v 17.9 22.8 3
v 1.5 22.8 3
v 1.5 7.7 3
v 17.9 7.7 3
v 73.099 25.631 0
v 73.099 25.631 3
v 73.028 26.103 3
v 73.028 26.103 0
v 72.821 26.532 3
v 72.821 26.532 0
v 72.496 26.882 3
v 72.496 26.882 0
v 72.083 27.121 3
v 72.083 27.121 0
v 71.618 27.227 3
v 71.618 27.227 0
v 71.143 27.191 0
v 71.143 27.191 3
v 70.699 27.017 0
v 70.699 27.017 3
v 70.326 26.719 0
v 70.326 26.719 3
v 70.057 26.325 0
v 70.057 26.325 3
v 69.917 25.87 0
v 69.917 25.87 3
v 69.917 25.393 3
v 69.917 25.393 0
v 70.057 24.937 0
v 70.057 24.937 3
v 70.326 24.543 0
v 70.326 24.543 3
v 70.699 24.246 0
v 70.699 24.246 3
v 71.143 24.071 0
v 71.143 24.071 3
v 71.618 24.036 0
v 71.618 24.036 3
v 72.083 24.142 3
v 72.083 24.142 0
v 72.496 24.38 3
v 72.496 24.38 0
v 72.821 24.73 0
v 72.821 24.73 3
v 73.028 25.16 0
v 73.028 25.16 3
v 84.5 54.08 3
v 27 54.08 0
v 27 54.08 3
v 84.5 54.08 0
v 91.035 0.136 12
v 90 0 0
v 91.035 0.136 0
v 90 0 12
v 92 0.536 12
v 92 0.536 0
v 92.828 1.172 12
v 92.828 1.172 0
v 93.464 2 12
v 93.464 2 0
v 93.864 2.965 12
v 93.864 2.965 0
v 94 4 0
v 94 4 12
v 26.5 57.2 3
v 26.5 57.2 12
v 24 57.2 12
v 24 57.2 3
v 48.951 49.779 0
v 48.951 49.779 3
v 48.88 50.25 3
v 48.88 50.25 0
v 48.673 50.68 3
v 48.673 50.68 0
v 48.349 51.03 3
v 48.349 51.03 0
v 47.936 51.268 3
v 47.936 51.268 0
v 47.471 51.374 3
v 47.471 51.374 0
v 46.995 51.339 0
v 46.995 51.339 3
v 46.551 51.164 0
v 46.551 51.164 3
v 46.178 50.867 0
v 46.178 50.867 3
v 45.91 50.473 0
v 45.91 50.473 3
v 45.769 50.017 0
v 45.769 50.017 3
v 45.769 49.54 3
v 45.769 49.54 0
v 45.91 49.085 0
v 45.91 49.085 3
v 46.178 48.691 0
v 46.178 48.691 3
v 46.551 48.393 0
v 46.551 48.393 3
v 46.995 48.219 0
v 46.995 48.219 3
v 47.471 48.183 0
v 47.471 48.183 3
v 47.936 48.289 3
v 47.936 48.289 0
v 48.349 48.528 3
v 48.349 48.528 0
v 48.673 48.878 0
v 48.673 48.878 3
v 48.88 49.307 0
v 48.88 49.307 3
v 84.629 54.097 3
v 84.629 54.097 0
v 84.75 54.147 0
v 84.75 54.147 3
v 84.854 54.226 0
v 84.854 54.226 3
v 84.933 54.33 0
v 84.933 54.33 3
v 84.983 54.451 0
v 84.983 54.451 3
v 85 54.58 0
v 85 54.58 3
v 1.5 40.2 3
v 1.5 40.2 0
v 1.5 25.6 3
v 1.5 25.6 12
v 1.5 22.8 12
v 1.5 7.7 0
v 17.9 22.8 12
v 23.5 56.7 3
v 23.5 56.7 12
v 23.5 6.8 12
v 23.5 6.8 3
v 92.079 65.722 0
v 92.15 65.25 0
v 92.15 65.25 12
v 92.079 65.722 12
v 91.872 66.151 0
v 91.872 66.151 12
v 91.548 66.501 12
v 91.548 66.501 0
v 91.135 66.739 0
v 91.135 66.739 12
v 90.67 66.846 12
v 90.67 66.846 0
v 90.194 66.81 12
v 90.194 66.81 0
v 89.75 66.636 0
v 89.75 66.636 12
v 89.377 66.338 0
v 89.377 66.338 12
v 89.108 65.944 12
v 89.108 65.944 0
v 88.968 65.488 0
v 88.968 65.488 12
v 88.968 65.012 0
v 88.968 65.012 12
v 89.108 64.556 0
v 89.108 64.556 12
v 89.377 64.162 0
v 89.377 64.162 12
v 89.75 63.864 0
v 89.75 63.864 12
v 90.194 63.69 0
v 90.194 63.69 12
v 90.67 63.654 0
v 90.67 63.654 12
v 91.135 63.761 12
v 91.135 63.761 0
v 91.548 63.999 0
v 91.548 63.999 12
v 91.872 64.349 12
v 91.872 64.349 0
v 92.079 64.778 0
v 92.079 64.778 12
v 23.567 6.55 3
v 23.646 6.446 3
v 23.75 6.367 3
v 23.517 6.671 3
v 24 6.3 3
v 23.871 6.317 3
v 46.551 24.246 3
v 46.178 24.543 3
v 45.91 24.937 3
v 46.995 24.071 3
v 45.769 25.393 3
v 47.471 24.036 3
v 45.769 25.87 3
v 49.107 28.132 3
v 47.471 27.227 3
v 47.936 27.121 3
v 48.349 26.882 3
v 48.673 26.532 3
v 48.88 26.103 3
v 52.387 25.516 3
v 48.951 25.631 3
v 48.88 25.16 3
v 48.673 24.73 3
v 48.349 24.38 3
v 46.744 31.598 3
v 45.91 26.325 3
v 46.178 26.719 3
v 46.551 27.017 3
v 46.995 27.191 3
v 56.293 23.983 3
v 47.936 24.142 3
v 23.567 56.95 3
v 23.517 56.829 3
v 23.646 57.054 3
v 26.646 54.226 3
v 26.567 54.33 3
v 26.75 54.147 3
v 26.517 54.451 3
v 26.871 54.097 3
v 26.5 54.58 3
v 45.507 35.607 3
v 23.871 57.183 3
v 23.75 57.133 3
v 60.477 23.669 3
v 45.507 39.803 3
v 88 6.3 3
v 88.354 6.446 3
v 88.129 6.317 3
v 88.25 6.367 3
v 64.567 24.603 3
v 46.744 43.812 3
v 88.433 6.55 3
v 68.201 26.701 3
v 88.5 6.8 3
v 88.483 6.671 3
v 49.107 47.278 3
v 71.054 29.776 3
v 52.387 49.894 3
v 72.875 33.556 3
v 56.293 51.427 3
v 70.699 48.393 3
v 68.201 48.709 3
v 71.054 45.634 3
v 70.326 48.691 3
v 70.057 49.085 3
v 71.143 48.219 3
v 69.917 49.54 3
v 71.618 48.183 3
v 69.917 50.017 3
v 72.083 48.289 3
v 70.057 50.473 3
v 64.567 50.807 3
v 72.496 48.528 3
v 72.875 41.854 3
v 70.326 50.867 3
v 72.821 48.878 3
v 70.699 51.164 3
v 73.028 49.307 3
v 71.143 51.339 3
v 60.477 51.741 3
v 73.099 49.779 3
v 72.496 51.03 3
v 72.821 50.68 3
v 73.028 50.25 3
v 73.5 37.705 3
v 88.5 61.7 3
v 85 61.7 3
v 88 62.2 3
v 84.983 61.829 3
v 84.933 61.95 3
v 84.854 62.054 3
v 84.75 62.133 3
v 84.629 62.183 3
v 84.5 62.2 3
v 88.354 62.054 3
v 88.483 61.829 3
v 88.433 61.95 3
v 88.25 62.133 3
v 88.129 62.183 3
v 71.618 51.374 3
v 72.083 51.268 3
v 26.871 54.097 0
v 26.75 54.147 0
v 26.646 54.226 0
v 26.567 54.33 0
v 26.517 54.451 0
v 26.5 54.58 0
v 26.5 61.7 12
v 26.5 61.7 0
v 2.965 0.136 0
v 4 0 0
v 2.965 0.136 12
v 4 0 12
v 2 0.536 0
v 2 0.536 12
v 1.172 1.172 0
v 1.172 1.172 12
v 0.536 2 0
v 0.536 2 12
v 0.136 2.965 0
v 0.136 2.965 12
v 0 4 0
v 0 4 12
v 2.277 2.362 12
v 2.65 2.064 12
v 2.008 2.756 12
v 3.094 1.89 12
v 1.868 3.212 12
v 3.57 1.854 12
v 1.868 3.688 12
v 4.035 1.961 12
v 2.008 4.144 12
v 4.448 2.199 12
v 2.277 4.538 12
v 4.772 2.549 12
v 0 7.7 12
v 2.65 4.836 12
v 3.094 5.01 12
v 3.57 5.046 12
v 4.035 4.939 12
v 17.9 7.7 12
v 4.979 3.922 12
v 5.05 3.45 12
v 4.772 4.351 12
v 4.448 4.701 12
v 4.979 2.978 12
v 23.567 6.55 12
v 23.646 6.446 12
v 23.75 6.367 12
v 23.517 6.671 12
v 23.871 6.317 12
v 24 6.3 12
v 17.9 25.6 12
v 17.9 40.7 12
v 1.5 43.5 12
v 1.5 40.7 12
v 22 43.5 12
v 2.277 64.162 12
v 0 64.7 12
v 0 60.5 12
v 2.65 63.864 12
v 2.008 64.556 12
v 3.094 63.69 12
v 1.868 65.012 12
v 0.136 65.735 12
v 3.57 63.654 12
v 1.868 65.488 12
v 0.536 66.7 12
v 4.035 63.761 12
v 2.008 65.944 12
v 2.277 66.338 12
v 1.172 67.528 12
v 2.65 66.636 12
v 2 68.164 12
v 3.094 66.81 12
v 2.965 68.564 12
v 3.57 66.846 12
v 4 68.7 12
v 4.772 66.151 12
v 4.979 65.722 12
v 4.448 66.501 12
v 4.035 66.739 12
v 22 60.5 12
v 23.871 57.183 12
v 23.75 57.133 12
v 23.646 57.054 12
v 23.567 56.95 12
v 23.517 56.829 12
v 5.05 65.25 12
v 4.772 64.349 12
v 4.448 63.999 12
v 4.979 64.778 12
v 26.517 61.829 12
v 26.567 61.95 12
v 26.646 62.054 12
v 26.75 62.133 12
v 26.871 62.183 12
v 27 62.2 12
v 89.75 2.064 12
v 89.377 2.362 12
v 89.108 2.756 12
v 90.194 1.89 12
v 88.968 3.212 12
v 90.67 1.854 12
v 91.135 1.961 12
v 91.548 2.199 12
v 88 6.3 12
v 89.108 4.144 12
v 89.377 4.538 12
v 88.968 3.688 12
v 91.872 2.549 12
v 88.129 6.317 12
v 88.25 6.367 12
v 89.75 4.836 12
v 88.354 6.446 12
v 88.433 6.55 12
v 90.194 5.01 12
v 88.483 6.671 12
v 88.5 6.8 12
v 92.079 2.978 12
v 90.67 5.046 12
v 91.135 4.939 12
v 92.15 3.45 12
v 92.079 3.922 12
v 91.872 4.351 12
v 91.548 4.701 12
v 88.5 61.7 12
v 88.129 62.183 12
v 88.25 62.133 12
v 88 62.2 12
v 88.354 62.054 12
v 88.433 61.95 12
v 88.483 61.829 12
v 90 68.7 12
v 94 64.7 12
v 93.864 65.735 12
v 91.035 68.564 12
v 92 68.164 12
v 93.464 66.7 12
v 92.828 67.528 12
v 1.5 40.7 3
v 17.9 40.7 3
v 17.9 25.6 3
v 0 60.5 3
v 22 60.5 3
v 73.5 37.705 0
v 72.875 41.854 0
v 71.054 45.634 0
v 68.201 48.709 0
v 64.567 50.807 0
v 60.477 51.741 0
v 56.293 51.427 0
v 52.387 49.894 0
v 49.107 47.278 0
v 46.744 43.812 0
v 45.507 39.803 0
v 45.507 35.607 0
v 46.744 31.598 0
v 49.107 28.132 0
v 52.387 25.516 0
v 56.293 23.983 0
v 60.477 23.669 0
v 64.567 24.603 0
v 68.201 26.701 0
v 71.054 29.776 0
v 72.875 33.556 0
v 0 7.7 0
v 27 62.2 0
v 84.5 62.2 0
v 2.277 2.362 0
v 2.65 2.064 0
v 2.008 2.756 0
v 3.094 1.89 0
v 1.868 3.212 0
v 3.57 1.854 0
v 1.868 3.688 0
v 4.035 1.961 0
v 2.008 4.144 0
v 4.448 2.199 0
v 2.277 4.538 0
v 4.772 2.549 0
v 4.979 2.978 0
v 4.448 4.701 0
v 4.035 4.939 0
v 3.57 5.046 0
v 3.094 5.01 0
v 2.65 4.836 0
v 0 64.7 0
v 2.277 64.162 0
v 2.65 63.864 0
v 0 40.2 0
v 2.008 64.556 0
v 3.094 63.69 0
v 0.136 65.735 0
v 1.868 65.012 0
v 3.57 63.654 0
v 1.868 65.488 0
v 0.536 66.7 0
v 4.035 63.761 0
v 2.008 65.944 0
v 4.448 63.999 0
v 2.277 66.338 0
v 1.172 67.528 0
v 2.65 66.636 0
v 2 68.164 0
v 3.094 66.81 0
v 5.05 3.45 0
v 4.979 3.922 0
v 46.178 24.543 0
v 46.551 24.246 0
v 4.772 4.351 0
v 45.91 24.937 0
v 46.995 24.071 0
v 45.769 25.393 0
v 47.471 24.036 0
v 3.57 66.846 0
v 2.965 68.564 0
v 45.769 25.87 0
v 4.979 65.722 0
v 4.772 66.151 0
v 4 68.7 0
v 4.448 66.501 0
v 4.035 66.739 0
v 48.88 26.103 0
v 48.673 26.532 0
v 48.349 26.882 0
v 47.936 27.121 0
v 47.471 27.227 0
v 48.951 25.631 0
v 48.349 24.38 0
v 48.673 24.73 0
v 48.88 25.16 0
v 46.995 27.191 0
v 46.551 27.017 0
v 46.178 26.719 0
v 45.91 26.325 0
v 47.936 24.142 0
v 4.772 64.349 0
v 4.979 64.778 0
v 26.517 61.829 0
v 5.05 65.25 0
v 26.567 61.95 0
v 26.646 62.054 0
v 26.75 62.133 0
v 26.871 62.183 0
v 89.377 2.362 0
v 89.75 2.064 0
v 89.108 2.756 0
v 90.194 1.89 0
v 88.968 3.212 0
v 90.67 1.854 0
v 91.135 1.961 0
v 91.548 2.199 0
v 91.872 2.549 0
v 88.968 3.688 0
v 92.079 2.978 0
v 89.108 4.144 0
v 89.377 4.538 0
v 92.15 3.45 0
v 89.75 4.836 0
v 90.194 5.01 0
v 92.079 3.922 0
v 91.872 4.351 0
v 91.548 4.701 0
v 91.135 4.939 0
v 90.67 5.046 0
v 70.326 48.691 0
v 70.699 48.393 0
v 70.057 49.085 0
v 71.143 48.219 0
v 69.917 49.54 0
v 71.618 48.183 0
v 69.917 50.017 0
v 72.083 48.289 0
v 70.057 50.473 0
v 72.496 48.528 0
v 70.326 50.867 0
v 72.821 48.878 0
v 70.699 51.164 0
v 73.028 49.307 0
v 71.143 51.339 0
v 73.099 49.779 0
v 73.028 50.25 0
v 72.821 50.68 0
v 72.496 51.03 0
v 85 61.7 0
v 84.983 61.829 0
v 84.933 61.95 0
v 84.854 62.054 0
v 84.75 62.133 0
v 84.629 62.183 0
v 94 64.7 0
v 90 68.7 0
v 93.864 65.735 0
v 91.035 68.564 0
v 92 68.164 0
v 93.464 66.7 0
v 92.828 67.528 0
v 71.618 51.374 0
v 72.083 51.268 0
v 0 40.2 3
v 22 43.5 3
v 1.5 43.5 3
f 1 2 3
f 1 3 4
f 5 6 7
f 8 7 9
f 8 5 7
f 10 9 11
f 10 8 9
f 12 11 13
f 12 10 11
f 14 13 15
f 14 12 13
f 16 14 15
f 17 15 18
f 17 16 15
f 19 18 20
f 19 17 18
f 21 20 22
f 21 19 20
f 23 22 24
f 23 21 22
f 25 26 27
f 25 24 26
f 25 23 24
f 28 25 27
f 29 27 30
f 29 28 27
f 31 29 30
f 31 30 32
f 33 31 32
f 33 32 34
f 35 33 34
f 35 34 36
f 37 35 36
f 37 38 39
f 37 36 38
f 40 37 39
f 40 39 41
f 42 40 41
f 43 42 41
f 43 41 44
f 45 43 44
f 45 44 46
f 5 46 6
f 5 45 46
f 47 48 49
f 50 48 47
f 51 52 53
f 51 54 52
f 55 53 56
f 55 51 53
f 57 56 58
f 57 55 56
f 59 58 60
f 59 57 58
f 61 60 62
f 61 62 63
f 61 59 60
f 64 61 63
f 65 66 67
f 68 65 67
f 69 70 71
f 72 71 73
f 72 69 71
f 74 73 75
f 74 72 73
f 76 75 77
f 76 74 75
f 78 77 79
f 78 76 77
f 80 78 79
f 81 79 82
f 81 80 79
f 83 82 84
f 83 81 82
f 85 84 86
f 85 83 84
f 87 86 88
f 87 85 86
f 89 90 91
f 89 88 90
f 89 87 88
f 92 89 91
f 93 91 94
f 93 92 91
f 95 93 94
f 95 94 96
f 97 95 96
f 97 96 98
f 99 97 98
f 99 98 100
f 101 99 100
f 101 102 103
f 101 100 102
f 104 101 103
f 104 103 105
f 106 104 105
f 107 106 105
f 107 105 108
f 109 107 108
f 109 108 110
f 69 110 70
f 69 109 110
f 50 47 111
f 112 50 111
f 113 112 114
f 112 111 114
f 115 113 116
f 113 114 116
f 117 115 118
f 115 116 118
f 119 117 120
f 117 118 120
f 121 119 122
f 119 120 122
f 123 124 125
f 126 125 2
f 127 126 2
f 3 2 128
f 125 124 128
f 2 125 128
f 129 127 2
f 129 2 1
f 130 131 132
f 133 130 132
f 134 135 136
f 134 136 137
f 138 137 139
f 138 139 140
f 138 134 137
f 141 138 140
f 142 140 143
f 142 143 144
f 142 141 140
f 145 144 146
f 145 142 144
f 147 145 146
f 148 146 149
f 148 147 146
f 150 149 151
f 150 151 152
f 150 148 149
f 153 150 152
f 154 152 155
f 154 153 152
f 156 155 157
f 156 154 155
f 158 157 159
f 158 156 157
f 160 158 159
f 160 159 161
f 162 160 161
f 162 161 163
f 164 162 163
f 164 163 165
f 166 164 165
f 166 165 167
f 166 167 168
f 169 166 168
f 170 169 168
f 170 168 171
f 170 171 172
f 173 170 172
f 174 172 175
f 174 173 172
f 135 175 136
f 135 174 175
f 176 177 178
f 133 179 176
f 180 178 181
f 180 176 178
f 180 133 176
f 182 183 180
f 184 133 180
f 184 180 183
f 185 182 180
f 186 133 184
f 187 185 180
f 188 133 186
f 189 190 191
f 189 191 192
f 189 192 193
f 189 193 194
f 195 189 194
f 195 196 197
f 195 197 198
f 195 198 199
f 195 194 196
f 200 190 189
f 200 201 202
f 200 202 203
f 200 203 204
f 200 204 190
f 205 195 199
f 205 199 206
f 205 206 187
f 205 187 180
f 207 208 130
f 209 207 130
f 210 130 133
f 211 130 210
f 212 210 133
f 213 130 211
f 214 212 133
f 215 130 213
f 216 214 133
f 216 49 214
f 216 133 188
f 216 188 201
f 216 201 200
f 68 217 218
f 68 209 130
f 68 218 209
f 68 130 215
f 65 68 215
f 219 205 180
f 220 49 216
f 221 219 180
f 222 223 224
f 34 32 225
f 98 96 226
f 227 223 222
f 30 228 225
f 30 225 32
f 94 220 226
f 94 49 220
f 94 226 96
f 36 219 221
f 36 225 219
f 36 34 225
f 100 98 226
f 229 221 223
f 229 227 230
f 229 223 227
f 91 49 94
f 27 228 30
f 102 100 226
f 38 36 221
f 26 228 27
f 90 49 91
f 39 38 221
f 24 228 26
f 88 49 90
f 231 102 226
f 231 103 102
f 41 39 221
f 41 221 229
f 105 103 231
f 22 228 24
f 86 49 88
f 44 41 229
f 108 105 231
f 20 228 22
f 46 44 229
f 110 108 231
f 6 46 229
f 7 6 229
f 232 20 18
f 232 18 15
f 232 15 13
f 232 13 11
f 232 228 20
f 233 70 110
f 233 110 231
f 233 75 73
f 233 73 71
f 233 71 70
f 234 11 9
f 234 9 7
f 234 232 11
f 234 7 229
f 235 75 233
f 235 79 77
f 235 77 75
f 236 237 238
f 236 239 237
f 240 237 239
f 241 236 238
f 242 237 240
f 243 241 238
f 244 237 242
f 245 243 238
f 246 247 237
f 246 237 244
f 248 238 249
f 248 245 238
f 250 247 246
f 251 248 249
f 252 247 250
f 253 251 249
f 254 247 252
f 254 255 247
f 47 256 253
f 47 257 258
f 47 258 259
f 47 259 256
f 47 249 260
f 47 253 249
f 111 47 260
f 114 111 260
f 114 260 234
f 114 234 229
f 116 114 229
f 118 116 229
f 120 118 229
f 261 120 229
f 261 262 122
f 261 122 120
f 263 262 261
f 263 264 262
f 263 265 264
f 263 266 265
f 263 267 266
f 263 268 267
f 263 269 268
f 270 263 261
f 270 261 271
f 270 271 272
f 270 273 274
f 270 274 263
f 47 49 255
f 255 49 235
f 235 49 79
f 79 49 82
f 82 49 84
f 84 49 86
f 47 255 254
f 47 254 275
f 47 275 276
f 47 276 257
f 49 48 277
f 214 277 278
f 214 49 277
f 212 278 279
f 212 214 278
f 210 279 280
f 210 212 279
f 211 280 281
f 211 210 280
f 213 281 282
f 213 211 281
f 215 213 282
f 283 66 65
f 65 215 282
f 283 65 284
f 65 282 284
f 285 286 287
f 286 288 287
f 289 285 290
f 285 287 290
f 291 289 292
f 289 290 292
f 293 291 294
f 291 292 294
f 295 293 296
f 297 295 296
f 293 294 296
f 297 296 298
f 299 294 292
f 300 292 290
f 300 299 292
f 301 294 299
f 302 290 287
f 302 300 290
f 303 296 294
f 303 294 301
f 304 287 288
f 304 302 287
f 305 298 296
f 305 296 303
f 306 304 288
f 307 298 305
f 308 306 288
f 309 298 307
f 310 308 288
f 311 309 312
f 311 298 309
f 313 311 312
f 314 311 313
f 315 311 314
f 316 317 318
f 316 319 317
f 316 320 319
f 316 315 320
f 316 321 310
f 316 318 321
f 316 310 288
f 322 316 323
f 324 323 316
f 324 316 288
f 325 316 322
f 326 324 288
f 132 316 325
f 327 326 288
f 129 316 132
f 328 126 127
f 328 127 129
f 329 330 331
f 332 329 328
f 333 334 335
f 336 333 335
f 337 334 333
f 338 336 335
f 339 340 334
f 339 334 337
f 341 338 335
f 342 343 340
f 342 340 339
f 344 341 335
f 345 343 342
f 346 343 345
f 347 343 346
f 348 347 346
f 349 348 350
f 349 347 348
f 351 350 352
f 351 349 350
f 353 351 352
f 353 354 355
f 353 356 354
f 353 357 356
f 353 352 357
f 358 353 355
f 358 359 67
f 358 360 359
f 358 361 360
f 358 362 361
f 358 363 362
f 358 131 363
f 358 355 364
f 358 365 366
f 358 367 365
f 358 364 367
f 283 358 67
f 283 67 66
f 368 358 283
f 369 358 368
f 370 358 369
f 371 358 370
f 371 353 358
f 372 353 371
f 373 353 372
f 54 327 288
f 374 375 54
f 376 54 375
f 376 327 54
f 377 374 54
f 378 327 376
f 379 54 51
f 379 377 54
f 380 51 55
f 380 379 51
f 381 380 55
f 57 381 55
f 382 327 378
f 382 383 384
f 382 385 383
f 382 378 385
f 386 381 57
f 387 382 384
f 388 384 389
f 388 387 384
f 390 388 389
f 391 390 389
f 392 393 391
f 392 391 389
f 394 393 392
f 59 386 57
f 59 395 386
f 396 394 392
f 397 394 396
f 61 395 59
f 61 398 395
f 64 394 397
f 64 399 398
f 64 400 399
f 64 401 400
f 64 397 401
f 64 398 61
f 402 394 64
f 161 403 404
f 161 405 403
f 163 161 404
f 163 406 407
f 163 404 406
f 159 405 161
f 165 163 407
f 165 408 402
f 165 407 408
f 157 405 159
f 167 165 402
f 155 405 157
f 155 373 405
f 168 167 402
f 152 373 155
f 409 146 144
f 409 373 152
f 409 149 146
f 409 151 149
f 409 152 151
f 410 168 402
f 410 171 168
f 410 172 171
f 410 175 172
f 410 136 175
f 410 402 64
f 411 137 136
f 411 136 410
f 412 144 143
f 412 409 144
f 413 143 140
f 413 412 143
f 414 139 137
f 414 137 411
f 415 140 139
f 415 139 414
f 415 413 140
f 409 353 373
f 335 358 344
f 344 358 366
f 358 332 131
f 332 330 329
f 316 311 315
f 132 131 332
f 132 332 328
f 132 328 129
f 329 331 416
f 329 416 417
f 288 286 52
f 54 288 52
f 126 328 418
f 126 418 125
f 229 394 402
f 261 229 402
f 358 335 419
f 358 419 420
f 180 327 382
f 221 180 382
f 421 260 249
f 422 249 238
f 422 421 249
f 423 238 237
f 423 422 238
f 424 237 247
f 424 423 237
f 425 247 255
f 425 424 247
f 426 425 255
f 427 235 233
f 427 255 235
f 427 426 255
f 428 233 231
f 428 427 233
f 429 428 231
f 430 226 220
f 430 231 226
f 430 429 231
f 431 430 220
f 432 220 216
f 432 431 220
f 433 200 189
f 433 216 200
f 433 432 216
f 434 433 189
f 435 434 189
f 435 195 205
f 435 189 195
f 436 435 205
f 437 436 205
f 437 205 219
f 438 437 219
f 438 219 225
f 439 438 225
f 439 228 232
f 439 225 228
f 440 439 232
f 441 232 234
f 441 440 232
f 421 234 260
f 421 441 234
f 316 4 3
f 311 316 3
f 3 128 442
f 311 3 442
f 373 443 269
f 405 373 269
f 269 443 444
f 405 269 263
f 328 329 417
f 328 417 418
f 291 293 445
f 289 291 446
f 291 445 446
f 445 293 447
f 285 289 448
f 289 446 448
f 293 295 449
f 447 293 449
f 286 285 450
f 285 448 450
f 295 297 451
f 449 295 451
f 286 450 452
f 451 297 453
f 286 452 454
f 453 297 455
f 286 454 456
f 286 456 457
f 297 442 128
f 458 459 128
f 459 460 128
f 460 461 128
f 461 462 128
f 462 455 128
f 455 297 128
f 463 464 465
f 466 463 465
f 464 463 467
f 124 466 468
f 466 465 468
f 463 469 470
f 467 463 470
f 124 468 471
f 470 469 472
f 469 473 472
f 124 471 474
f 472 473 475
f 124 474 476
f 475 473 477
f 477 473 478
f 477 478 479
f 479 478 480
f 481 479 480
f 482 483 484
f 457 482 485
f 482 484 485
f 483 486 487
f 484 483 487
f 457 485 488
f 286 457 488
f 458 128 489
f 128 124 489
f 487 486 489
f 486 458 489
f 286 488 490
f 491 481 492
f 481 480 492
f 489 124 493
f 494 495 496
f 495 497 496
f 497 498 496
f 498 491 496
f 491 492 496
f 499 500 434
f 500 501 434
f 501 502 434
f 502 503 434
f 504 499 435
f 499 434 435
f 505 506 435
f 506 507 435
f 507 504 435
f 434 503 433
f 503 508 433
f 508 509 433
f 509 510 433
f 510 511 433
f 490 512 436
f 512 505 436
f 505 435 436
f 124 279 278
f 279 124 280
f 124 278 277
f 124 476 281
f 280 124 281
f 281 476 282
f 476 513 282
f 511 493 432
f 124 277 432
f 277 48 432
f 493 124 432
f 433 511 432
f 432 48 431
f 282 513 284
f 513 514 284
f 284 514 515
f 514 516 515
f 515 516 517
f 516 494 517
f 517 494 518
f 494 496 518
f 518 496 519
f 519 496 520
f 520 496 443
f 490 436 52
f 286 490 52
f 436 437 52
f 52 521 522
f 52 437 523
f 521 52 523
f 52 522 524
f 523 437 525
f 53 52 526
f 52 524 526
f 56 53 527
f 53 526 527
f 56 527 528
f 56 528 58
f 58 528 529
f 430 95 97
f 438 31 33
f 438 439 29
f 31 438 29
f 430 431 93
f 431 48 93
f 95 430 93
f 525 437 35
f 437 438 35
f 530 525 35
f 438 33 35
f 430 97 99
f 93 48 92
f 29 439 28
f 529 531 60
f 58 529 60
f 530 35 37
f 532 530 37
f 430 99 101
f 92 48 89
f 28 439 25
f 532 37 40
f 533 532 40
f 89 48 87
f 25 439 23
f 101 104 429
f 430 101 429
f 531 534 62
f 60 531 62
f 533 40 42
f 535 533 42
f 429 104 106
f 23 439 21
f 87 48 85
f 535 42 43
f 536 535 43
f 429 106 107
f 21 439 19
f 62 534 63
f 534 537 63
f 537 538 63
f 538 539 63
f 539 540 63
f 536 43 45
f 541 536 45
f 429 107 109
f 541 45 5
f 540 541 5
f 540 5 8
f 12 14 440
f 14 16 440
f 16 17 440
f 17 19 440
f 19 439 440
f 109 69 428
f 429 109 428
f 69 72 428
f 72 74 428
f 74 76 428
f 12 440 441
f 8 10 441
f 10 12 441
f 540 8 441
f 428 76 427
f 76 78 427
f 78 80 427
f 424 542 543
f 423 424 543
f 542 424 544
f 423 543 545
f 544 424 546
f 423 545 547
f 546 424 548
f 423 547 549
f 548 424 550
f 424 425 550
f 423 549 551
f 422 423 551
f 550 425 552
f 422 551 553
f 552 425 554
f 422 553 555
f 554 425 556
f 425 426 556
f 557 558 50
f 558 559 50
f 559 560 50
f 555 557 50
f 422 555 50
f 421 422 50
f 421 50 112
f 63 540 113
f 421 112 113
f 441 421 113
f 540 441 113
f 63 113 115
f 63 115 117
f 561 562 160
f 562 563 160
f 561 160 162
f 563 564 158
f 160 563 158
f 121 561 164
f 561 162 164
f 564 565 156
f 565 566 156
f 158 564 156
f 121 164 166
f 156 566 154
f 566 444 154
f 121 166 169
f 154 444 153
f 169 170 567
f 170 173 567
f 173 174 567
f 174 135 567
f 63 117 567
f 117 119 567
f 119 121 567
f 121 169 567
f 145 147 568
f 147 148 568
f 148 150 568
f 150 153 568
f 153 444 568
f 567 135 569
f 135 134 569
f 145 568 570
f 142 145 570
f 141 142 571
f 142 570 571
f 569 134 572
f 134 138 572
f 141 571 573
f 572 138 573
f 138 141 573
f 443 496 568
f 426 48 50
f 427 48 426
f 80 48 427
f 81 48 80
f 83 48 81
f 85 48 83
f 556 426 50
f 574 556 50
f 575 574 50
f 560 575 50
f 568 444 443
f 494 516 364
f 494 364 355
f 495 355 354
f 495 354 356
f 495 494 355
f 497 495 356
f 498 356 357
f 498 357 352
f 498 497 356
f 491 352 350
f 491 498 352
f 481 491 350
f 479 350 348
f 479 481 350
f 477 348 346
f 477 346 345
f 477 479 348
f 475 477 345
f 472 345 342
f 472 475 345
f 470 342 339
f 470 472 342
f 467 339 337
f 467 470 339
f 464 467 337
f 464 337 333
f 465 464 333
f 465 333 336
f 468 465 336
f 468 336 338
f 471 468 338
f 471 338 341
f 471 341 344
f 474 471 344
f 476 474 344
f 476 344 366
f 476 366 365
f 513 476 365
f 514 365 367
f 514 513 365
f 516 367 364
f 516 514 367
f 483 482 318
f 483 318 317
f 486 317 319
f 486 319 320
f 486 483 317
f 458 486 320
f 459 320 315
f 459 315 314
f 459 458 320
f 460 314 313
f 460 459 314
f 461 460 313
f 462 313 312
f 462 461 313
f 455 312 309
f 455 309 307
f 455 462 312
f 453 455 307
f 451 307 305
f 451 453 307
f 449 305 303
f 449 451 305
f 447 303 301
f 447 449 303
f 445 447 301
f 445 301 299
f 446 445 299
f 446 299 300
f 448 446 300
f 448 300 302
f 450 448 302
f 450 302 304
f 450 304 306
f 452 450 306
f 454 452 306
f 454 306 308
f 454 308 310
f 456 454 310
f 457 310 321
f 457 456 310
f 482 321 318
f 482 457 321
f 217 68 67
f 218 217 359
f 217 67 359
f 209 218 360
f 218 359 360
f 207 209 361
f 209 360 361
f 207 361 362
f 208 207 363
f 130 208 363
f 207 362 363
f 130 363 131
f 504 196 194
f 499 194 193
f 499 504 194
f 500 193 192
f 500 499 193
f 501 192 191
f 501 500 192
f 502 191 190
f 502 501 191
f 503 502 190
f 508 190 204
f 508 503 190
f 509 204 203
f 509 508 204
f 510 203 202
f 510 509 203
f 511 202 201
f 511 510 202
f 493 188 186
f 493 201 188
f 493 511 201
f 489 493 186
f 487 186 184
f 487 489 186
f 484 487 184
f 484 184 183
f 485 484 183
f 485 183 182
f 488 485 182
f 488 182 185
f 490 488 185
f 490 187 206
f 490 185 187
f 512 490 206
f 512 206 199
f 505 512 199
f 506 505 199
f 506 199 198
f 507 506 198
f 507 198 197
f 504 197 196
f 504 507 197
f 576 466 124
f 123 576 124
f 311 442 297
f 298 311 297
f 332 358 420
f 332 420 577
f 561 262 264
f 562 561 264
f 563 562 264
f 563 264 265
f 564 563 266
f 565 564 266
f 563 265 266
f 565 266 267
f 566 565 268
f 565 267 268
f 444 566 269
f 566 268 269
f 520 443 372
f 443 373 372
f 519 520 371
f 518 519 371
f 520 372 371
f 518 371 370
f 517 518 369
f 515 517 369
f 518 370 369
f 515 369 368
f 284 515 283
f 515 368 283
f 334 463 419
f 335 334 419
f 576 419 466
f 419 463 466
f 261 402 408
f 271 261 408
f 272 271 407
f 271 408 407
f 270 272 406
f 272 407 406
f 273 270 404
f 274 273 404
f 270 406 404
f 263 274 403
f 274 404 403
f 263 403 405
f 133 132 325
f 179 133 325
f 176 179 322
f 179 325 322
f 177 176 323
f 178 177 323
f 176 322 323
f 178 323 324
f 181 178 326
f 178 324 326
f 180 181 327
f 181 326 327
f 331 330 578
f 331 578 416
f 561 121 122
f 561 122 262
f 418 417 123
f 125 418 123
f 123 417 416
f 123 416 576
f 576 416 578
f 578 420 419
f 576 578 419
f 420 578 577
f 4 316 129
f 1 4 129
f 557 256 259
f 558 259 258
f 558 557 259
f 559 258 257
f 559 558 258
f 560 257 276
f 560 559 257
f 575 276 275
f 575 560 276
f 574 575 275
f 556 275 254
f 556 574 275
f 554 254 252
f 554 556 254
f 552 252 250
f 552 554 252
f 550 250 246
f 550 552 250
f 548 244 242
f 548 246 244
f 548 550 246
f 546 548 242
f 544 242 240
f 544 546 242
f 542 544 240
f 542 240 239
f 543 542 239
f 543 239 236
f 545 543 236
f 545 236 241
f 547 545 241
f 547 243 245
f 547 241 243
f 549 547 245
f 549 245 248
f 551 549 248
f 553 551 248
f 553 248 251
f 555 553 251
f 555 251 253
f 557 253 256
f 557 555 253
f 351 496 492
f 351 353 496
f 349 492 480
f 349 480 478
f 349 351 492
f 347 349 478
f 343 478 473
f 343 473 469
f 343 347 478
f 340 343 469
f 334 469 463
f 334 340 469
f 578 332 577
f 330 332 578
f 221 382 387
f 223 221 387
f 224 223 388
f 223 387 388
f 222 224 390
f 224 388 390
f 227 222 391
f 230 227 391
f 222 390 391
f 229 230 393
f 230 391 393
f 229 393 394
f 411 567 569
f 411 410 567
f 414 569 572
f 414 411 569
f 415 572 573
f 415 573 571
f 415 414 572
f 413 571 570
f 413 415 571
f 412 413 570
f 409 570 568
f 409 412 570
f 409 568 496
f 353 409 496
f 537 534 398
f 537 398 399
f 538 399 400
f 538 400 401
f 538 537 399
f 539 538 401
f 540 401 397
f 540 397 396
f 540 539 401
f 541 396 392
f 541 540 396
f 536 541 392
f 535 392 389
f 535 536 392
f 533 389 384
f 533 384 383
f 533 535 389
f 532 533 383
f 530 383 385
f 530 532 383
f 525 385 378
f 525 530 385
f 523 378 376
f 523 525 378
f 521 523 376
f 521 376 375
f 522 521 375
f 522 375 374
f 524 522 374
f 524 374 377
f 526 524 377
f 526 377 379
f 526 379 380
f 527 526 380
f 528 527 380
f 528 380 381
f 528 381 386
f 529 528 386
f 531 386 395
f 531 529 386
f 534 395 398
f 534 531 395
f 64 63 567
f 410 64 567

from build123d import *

# Parameters (mm, degrees)
SKETCH_R     = 1.6
SKETCH_R_2   = 14.075
SKETCH_W     = 58.5
SKETCH_H     = 8.12
PAD_DEPTH    = 12
FILLET_R     = 0.5
FILLET001_R  = 4
SKETCH001_W  = 16.4
SKETCH001_H  = 15.1
POCKET_DEPTH = 9


with BuildPart() as part:
    # Sketch → Pad (new body)
    with BuildSketch(Plane.XY):
        Polygon((0, 0), (94, 0), (94, 68.7), (0, 68.7), (0, 40.2), (1.5, 40.2), (1.5, 7.7), (0, 7.7), align=None)
        with Locations((3.45, 65.25)):
            Circle(SKETCH_R, mode=Mode.SUBTRACT)
        with Locations((90.55, 65.25)):
            Circle(SKETCH_R, mode=Mode.SUBTRACT)
        with Locations((90.55, 3.45)):
            Circle(SKETCH_R, mode=Mode.SUBTRACT)
        with Locations((3.45, 3.45)):
            Circle(SKETCH_R, mode=Mode.SUBTRACT)
        with Locations((59.425, 37.705)):
            Circle(SKETCH_R_2, mode=Mode.SUBTRACT)
        with Locations((47.351152, 25.631152)):
            Circle(SKETCH_R, mode=Mode.SUBTRACT)
        with Locations((71.498848, 25.631152)):
            Circle(SKETCH_R, mode=Mode.SUBTRACT)
        with Locations((71.498848, 49.778848)):
            Circle(SKETCH_R, mode=Mode.SUBTRACT)
        with Locations((47.351152, 49.778848)):
            Circle(SKETCH_R, mode=Mode.SUBTRACT)
        with Locations((55.75, 58.14)):
            Rectangle(SKETCH_W, SKETCH_H, mode=Mode.SUBTRACT)
    extrude(amount=PAD_DEPTH)

    # Fillet
    fillet_edges = [part.edges().sort_by_distance(p)[0] for p in [
        (85, 62.2, 6),
        (85, 54.08, 6),
        (26.5, 54.08, 6),
        (26.5, 62.2, 6),
    ]]
    fillet(fillet_edges, radius=FILLET_R)

    # Fillet001
    fillet001_edges = [part.edges().sort_by_distance(p)[0] for p in [
        (0, 68.7, 6),
        (94, 68.7, 6),
        (94, 0, 6),
        (0, 0, 6),
    ]]
    fillet(fillet001_edges, radius=FILLET001_R)

    # Sketch001 (on Face31 of Fillet001) → Pocket (cut)
    with BuildSketch(Plane.XY.offset(12)):
        with BuildLine():
            Line((26.5, 61.7), (26.5, 57.2))
            Line((26.5, 57.2), (24, 57.2))
            ThreePointArc((24, 57.2), (23.646447, 57.053553), (23.5, 56.7))
            Line((23.5, 56.7), (23.5, 6.8))
            ThreePointArc((23.5, 6.8), (23.646447, 6.446447), (24, 6.3))
            Line((24, 6.3), (88, 6.3))
            ThreePointArc((88, 6.3), (88.353553, 6.446447), (88.5, 6.8))
            Line((88.5, 6.8), (88.5, 61.7))
            ThreePointArc((88.5, 61.7), (88.353553, 62.053553), (88, 62.2))
            Line((88, 62.2), (27, 62.2))
            ThreePointArc((27, 62.2), (26.646447, 62.053553), (26.5, 61.7))
        make_face()
        Polygon((0, 60.5), (22, 60.5), (22, 43.5), (1.5, 43.5), (1.5, 40.7), (17.9, 40.7), (17.9, 25.6), (1.5, 25.6), (1.5, 40.2), (0, 40.2), align=None)
        with Locations((9.7, 15.25)):
            Rectangle(SKETCH001_W, SKETCH001_H)
    extrude(amount=-POCKET_DEPTH, mode=Mode.SUBTRACT)


solid = part.part
